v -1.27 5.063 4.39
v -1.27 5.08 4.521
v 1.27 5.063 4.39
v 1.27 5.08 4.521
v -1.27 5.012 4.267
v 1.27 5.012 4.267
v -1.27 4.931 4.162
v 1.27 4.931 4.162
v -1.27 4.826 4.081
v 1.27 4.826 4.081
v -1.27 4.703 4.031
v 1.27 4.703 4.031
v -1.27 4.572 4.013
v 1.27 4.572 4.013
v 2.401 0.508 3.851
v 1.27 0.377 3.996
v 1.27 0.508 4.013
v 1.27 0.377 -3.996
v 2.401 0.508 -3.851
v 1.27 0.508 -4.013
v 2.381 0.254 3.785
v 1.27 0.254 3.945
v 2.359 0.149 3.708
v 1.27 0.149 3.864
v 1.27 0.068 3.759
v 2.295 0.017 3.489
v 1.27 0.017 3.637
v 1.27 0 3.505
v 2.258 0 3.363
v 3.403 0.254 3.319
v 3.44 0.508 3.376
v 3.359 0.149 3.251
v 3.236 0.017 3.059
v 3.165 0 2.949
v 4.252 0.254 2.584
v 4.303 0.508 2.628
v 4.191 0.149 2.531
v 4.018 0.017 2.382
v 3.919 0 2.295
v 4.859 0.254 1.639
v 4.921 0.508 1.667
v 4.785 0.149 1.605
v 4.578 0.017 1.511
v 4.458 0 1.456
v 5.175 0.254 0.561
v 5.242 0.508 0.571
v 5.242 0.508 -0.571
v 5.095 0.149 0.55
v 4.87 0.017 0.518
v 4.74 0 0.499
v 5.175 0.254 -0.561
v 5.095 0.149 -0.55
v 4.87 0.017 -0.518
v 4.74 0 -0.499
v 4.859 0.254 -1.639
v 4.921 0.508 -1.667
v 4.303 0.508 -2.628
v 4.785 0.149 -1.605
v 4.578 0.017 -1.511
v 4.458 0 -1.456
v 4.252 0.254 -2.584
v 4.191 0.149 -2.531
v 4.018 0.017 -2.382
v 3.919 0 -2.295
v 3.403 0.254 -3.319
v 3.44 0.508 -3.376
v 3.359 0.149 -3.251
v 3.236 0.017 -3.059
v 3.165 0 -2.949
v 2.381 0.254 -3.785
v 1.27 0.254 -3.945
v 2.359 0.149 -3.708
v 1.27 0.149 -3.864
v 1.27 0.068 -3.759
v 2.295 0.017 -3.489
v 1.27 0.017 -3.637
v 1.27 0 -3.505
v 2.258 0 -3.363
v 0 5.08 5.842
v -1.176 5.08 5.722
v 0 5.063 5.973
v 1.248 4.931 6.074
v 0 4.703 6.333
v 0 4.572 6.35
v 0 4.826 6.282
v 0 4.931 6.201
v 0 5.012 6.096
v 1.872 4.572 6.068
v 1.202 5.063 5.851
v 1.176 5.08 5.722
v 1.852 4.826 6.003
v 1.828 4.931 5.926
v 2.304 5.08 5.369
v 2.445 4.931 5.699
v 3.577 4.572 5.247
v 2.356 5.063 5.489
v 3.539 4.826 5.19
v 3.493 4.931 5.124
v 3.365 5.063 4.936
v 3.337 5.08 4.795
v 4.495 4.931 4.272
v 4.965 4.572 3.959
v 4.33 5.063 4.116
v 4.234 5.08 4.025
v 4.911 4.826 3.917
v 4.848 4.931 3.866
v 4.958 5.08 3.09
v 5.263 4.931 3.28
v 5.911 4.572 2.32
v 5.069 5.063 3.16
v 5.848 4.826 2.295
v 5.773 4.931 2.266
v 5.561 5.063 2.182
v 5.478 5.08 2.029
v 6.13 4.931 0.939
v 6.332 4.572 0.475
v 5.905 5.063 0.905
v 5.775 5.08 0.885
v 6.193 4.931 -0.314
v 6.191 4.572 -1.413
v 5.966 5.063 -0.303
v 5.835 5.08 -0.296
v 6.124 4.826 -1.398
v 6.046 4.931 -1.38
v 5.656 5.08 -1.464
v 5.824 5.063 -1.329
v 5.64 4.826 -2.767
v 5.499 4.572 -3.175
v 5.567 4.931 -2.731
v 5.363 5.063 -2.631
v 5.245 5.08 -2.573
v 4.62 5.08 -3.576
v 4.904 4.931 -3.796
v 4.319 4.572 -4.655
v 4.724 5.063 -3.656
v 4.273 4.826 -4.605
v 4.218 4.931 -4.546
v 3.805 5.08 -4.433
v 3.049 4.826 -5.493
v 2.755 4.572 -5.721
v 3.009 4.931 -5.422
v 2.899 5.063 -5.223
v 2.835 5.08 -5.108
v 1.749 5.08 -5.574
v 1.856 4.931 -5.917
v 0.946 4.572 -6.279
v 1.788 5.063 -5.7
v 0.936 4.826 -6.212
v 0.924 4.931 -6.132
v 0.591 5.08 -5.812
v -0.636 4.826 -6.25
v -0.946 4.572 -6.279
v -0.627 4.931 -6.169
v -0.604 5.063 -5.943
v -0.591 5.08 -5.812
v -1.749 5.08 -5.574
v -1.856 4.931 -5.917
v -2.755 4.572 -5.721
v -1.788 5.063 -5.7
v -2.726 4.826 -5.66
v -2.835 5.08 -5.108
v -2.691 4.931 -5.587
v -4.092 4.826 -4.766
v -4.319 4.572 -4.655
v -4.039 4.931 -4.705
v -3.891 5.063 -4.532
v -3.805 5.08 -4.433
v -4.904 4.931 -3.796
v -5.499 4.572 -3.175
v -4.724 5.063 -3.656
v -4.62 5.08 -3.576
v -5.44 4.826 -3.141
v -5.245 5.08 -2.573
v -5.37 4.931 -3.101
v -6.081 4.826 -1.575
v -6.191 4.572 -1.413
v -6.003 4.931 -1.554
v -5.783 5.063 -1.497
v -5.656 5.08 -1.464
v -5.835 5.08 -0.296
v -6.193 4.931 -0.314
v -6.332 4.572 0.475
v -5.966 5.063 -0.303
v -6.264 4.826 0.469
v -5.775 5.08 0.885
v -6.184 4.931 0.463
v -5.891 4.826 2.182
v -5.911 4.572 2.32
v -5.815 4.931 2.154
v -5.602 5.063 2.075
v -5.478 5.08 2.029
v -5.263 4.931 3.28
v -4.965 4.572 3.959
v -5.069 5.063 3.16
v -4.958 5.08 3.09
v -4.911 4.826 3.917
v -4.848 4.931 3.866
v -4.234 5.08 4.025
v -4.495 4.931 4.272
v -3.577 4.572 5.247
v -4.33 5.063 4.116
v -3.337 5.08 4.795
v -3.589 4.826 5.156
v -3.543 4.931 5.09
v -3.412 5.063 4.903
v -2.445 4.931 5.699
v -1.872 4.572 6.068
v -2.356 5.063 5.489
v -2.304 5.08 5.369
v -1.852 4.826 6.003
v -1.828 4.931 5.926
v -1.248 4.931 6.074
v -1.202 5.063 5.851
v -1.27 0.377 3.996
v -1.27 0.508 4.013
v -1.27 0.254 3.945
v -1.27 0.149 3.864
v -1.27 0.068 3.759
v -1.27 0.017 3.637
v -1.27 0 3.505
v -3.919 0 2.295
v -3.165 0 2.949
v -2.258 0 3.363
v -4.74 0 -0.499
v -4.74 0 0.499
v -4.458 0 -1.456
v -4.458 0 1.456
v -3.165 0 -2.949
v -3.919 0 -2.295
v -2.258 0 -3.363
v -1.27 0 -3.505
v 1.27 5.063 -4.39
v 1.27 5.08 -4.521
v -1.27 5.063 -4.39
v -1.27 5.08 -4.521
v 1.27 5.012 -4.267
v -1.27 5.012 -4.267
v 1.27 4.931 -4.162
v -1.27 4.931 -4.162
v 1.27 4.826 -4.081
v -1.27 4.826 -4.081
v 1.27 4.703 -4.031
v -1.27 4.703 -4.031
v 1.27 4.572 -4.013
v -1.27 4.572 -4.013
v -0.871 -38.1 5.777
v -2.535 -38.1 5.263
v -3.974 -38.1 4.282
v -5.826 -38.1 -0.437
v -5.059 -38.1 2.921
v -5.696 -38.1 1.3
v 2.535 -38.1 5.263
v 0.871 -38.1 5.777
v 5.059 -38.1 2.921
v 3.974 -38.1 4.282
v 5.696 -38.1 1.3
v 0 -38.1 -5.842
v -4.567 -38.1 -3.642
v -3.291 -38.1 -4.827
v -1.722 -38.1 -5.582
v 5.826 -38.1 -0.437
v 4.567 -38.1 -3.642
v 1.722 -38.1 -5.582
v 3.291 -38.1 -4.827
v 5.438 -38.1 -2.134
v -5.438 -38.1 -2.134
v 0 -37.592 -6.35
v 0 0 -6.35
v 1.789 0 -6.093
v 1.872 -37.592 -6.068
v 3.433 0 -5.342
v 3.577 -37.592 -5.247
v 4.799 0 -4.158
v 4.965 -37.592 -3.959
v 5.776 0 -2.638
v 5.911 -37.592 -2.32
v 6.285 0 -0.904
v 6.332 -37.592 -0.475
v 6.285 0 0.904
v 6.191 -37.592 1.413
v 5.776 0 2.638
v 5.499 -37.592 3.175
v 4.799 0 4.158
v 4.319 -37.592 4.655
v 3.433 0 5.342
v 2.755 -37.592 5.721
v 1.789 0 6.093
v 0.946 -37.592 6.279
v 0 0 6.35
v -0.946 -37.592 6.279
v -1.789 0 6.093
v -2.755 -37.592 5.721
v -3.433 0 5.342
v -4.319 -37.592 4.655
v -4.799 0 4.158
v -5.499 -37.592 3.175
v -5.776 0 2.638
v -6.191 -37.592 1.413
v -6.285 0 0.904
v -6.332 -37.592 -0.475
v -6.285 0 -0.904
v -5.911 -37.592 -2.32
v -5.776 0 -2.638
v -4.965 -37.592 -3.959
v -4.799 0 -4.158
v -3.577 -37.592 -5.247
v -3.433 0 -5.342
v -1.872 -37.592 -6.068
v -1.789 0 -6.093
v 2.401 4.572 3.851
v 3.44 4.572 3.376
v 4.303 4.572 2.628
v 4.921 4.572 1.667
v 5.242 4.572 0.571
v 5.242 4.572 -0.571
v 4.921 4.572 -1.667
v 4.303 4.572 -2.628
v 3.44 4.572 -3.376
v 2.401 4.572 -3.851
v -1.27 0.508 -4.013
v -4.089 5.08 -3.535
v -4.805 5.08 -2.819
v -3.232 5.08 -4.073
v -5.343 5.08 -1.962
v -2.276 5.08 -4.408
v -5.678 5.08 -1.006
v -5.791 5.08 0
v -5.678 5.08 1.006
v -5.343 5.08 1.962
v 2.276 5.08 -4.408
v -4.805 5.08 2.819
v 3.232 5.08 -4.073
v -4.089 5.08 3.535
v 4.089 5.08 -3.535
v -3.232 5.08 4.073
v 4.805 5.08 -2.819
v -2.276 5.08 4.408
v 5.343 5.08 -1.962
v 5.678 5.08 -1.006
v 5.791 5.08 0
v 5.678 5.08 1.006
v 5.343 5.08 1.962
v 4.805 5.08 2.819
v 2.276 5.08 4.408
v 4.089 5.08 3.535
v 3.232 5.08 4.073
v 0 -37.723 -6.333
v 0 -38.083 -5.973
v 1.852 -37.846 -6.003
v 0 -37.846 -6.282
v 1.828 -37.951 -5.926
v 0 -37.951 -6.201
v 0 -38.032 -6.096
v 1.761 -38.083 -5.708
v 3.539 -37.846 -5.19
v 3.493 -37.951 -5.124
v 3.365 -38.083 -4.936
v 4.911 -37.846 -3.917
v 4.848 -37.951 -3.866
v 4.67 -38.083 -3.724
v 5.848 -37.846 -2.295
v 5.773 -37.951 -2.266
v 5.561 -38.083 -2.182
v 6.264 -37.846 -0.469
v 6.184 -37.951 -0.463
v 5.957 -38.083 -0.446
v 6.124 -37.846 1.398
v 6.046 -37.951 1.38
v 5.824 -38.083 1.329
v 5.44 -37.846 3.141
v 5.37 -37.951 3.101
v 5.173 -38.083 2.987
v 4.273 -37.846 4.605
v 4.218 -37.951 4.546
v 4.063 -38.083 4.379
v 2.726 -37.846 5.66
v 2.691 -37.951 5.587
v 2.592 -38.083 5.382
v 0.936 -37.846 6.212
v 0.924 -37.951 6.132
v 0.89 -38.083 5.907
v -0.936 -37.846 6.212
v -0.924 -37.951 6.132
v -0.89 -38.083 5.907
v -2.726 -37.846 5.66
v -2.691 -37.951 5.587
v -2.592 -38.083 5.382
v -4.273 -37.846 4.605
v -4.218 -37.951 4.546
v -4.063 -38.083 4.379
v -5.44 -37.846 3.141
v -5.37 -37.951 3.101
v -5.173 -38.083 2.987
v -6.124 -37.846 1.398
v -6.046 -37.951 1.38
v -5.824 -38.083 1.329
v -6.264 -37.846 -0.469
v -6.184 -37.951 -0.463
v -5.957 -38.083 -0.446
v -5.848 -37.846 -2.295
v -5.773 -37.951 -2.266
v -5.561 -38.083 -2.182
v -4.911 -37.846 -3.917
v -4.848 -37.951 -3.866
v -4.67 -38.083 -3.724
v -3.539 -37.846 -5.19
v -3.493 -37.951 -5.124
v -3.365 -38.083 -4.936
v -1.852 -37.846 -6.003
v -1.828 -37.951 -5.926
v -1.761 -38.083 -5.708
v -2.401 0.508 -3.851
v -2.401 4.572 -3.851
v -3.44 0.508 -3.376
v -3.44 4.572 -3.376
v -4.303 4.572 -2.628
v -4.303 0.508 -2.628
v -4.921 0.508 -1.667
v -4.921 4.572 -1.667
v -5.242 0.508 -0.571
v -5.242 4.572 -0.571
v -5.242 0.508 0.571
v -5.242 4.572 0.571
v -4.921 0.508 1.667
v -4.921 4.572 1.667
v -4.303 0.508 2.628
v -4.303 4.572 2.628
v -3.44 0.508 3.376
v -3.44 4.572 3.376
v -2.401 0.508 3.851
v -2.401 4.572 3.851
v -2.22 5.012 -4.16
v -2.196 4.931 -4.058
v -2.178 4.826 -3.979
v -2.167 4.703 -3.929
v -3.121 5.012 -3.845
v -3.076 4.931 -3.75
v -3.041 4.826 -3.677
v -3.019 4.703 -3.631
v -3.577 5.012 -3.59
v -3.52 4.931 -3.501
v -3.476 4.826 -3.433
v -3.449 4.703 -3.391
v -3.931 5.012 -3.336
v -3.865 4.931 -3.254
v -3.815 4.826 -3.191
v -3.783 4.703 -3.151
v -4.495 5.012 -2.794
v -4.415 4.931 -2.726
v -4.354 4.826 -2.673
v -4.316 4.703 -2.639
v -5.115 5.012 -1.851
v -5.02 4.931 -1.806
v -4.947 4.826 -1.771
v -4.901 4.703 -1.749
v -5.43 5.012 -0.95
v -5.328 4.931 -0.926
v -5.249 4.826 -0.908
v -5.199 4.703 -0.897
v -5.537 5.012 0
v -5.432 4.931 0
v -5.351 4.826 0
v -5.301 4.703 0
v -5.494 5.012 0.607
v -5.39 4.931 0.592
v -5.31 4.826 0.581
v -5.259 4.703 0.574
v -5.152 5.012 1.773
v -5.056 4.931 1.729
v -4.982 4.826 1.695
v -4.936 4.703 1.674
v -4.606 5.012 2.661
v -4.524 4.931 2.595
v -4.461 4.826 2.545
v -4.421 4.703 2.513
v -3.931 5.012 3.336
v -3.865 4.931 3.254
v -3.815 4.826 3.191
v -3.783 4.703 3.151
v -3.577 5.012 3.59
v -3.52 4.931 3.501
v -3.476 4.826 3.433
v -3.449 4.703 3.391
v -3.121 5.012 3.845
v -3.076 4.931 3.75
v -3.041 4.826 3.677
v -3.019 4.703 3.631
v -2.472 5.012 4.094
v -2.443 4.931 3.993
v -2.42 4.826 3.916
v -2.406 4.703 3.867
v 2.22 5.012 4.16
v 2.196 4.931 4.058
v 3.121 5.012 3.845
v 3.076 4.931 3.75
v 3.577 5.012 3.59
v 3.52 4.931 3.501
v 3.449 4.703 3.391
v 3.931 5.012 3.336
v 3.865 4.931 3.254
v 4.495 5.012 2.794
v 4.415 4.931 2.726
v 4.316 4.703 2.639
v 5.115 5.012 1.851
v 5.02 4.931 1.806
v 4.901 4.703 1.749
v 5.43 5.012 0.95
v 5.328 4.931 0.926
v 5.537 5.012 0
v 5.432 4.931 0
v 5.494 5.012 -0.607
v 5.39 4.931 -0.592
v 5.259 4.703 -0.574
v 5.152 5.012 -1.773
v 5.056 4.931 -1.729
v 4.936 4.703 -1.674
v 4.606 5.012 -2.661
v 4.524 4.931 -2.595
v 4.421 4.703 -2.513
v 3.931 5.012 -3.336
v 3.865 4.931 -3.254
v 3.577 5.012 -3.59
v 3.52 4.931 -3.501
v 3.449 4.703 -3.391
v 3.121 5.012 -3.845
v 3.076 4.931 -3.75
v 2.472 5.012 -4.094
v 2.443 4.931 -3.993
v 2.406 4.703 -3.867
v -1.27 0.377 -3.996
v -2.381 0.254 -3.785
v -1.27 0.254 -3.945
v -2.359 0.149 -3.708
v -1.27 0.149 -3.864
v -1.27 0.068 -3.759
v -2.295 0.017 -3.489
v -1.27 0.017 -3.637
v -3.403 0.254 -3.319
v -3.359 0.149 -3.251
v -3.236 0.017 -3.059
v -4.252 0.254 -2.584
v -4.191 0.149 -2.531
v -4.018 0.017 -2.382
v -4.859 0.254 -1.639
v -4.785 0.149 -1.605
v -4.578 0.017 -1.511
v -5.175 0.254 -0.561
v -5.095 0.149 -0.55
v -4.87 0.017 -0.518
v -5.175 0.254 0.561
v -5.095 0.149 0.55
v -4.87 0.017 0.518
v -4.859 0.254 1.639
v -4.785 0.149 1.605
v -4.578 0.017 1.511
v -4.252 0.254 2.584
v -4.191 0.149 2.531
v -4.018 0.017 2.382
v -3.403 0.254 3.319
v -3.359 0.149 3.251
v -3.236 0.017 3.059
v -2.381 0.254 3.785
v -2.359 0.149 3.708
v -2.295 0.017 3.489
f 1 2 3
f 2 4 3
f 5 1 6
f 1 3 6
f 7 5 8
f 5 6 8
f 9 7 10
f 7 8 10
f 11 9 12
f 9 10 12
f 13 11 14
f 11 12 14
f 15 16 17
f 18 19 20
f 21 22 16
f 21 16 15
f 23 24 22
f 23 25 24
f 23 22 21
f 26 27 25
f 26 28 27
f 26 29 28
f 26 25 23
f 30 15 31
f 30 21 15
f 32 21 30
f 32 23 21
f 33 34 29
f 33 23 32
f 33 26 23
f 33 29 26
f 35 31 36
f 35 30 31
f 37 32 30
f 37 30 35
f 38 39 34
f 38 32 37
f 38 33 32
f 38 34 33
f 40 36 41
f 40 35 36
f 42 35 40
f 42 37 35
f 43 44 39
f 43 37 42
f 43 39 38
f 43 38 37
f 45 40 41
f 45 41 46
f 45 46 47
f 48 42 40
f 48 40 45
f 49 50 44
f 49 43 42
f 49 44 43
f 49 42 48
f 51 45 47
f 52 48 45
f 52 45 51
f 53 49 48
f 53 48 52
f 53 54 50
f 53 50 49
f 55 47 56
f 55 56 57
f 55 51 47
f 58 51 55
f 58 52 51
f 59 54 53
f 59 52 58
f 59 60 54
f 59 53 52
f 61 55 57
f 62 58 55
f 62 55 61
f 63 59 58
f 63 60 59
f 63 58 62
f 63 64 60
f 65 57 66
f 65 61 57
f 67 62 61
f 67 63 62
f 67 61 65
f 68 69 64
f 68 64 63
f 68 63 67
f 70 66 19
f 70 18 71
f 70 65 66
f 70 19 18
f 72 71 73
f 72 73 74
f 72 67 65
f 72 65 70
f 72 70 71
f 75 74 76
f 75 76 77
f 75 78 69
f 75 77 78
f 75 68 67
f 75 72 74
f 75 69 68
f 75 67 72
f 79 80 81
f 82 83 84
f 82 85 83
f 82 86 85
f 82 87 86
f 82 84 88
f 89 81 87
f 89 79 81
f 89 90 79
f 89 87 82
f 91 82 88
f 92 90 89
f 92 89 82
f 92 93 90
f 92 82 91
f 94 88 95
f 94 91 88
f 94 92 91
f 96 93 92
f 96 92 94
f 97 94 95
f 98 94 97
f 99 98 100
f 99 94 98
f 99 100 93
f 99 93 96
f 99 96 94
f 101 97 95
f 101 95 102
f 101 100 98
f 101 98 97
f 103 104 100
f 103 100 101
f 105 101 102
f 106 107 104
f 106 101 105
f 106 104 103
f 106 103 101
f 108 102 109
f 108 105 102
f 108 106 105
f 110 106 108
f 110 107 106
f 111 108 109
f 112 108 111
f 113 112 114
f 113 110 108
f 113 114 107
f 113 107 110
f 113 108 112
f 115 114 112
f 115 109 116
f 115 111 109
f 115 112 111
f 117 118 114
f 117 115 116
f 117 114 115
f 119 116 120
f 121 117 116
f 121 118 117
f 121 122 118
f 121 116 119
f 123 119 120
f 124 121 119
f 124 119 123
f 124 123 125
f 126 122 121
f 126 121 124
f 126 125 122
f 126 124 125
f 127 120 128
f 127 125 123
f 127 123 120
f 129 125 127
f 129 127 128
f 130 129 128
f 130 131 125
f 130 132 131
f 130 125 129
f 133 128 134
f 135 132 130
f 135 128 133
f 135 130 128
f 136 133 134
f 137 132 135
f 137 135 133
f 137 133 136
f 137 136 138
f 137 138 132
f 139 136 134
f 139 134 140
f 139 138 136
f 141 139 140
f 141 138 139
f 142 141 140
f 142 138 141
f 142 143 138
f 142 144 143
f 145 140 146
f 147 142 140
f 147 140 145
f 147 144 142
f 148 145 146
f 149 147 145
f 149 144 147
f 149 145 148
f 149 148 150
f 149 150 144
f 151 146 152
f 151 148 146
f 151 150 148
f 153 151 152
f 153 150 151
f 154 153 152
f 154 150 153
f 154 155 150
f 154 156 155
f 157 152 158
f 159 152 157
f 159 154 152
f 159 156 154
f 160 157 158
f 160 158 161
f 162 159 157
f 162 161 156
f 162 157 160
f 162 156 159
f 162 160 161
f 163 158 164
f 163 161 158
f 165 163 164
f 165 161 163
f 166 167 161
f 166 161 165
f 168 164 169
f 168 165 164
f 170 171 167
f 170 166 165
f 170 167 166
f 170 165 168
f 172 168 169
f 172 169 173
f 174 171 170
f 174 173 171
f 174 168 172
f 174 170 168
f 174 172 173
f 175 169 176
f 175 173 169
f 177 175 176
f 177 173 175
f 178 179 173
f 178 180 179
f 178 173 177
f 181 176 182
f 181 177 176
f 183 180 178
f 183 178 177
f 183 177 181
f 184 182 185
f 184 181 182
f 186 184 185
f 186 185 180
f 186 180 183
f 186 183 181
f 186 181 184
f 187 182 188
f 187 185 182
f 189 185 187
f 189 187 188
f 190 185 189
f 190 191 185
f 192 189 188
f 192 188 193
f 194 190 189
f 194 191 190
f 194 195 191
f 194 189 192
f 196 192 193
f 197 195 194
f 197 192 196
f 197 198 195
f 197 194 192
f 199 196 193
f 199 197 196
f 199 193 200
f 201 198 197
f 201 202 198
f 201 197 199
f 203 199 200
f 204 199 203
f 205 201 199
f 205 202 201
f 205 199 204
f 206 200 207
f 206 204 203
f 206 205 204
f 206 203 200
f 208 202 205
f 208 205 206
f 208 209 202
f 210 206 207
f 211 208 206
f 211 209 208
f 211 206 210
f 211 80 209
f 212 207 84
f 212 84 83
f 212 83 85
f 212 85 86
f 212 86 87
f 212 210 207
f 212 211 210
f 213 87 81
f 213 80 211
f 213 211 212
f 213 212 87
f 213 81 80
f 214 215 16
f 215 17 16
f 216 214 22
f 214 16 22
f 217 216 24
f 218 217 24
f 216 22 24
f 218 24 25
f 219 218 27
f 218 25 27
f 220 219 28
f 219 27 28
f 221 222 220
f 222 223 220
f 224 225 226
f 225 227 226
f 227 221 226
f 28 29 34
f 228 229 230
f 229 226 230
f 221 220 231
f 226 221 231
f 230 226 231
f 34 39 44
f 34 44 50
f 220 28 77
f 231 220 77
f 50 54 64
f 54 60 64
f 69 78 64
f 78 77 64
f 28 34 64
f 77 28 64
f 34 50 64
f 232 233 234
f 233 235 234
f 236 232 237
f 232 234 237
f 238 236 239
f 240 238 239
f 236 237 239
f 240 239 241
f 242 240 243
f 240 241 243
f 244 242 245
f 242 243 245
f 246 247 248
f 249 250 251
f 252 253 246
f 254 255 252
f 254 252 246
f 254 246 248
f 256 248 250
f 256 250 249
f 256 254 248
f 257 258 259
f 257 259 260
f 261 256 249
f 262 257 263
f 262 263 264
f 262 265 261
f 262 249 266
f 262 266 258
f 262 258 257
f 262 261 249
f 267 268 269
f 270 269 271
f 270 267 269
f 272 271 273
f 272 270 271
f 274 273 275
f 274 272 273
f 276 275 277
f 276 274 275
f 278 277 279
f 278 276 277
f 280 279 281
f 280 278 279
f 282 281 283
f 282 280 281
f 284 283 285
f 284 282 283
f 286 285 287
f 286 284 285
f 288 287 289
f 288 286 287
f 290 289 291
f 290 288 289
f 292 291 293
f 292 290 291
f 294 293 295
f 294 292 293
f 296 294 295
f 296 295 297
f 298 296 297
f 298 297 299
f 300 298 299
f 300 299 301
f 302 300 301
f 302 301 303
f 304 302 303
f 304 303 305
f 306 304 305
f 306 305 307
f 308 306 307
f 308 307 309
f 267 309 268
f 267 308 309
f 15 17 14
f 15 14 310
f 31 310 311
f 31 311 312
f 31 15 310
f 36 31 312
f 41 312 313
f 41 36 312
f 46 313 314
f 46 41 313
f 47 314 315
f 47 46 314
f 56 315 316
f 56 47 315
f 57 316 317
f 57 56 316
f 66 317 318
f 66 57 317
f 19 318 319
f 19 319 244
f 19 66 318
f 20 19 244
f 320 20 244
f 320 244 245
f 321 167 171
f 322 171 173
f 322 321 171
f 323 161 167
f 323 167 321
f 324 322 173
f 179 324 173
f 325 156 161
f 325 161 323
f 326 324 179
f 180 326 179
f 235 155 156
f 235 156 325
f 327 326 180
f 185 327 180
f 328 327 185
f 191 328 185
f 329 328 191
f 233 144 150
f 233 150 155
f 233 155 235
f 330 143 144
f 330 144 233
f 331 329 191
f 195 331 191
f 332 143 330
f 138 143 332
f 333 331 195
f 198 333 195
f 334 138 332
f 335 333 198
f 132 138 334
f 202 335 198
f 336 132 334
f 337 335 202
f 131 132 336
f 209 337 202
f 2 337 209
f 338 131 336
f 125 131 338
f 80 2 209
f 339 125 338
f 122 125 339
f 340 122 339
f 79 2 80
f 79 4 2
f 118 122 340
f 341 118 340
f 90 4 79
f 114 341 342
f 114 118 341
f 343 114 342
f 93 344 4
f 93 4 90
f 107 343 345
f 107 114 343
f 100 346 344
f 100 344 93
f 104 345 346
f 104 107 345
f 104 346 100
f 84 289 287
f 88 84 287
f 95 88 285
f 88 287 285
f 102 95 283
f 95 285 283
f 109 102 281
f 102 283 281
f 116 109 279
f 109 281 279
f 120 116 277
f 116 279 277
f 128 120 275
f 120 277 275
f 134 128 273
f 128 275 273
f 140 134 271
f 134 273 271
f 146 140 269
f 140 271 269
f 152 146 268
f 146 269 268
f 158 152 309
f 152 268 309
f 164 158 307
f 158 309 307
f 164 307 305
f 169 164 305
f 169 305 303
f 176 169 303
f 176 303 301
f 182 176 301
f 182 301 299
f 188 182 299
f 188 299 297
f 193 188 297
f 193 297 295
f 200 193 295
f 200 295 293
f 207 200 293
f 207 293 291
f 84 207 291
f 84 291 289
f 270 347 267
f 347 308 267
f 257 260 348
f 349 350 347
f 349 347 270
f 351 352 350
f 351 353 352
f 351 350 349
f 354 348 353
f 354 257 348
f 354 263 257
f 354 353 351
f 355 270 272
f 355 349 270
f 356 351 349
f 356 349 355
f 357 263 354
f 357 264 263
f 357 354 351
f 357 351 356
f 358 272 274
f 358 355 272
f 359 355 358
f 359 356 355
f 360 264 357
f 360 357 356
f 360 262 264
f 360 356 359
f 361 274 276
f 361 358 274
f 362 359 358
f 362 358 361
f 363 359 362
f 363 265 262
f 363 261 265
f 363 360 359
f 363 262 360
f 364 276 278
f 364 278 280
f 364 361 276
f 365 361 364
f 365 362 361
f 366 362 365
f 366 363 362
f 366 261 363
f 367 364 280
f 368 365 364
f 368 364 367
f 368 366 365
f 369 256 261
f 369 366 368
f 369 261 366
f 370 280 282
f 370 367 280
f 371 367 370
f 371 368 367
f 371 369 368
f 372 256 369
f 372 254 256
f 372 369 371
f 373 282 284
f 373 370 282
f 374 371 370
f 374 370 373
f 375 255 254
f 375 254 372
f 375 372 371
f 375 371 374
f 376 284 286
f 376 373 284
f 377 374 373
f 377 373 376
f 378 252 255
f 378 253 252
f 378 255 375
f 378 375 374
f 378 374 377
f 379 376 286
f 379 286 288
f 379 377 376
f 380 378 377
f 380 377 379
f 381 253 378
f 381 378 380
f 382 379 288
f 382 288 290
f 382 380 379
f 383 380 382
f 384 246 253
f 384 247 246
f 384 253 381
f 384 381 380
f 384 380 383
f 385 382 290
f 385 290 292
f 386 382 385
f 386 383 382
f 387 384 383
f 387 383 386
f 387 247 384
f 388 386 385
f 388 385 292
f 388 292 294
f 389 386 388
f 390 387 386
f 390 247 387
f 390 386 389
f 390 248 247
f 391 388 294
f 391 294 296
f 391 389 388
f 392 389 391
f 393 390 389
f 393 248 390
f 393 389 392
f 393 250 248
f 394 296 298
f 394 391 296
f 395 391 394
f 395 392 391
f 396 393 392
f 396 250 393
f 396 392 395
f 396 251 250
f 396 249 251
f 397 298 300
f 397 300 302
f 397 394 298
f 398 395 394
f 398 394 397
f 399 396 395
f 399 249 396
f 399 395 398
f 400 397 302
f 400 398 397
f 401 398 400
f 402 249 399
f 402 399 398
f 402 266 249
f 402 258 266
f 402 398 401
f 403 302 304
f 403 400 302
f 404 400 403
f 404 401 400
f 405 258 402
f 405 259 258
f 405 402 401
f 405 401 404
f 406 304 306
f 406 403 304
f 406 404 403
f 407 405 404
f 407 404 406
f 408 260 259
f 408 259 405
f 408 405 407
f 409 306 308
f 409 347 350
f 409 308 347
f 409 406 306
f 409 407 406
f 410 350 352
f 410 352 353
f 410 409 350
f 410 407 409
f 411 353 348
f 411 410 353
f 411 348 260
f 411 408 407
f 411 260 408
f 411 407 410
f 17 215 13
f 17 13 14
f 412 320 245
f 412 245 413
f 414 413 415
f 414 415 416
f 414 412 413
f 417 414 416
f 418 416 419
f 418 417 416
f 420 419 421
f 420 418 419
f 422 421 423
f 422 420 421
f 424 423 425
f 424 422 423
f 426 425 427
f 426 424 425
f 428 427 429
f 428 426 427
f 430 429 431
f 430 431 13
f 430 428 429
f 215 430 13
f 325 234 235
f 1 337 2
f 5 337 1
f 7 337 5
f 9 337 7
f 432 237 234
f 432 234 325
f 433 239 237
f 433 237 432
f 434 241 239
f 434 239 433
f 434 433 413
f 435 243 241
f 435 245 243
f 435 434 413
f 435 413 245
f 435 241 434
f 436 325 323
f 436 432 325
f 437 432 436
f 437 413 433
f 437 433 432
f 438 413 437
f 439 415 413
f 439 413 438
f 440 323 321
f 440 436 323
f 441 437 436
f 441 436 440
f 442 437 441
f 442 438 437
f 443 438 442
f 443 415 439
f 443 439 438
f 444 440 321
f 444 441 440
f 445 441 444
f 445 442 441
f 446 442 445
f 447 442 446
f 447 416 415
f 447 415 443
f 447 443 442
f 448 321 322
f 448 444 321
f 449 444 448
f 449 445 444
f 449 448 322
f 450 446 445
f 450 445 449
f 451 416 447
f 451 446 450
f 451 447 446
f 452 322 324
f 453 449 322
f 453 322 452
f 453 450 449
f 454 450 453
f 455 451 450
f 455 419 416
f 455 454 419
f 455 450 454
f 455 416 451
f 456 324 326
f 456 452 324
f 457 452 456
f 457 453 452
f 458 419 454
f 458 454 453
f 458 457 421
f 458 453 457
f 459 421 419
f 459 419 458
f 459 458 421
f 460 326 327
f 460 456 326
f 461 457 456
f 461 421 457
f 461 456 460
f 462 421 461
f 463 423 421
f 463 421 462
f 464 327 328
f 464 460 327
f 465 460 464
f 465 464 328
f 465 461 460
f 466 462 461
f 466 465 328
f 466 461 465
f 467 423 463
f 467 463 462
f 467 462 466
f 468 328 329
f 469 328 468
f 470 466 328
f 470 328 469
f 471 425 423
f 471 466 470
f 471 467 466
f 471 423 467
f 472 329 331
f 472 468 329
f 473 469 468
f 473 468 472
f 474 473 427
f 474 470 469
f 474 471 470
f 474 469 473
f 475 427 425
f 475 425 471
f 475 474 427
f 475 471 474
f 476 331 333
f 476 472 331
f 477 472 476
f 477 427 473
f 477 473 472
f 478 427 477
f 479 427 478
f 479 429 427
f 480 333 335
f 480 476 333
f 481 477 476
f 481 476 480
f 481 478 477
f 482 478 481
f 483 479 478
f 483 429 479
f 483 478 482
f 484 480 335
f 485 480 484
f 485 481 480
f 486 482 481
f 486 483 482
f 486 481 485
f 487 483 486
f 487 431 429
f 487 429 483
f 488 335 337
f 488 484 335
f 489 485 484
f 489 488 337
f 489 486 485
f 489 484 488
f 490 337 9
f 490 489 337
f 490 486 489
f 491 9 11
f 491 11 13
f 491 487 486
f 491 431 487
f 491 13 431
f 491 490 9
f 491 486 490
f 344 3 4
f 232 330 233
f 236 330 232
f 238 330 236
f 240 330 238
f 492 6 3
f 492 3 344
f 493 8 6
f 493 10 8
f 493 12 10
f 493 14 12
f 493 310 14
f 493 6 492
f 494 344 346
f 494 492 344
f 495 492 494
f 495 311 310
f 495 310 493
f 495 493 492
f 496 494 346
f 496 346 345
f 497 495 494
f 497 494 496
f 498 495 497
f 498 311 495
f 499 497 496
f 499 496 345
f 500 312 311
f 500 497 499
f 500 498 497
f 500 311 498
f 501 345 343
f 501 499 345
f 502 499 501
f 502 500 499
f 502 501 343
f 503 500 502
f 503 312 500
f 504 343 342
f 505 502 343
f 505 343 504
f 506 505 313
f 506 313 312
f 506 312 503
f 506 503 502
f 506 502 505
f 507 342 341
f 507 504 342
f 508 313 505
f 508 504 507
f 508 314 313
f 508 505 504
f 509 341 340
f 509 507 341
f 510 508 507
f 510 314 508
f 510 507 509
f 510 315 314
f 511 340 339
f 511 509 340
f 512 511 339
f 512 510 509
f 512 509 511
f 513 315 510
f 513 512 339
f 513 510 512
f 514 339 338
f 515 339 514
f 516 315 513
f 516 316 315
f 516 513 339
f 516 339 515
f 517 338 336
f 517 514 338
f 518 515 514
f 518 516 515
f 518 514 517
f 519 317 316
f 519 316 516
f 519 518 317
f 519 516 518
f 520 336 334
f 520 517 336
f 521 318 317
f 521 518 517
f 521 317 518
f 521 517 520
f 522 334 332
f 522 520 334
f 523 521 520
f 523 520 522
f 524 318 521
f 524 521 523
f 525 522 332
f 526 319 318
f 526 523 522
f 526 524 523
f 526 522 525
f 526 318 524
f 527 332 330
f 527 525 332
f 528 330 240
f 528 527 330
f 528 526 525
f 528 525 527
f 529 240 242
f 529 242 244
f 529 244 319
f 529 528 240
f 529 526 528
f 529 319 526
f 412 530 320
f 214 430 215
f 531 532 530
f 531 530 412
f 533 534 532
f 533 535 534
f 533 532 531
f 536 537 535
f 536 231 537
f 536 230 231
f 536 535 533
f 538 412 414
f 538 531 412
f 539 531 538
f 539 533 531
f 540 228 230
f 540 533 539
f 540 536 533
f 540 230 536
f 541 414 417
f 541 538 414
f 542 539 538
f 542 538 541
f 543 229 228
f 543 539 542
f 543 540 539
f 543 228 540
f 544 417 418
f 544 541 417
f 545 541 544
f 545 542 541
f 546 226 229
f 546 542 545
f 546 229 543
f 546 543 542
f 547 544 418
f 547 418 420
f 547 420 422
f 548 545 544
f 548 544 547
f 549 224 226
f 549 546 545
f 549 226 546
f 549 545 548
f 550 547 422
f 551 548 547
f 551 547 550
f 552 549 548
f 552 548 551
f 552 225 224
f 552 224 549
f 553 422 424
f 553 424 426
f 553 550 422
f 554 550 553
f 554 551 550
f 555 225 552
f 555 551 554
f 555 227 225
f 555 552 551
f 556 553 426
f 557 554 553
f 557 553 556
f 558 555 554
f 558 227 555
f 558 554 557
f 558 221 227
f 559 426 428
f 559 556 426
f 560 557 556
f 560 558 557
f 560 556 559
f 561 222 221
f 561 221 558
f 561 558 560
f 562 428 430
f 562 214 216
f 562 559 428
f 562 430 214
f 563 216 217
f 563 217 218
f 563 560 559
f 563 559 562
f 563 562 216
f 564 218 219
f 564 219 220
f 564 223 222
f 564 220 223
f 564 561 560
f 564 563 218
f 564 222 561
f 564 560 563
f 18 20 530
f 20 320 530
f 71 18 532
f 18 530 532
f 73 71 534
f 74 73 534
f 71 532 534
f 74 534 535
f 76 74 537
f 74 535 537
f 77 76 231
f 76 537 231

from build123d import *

# Parameters (mm, degrees)
SKETCH1_R           = 6.35
BOSS_EXTRUDE1_DEPTH = 5.08
BOSS_EXTRUDE2_START = 38.1
SKETCH2_R           = 6.35
BOSS_EXTRUDE2_DEPTH = 38.1
FILLET1_R           = 0.508


with BuildPart() as part:
    # Sketch1 → Boss-Extrude1 (new body)
    with BuildSketch(Plane(origin=(0, 0, 0), x_dir=(1, 0, 0), z_dir=(0, 1, 0))):
        with Locations(Location((0, 0, 0), (0, 0, 270))):
            Circle(SKETCH1_R)
        with BuildLine():
            ThreePointArc((-1.27, 4.0132), (-5.2832, 0), (-1.27, -4.0132))
            Line((-1.27, -4.0132), (1.27, -4.0132))
            ThreePointArc((1.27, -4.0132), (5.2832, 0), (1.27, 4.0132))
            Line((1.27, 4.0132), (-1.27, 4.0132))
        make_face(mode=Mode.SUBTRACT)
    extrude(amount=BOSS_EXTRUDE1_DEPTH)

    # Sketch2 → Boss-Extrude2 (add)
    with BuildSketch(Plane.XZ.offset(BOSS_EXTRUDE2_START)):
        with Locations(Location((0, 0, 0), (0, 0, 270))):
            Circle(SKETCH2_R)
    extrude(amount=-BOSS_EXTRUDE2_DEPTH)

    # Fillet1
    fillet1_edges = [part.edges().sort_by_distance(p)[0] for p in [
        (0, 5.08, -4.0132),
        (5.2832, 5.08, 0),
        (0, -38.1, 6.35),
        (0, 5.08, 4.0132),
        (0, 5.08, -6.35),
        (-5.2832, 5.08, 0),
        (0, 0, 4.0132),
        (5.2832, 0, 0),
        (0, 0, -4.0132),
        (-5.2832, 0, 0),
    ]]
    fillet(fillet1_edges, radius=FILLET1_R)


solid = part.part
